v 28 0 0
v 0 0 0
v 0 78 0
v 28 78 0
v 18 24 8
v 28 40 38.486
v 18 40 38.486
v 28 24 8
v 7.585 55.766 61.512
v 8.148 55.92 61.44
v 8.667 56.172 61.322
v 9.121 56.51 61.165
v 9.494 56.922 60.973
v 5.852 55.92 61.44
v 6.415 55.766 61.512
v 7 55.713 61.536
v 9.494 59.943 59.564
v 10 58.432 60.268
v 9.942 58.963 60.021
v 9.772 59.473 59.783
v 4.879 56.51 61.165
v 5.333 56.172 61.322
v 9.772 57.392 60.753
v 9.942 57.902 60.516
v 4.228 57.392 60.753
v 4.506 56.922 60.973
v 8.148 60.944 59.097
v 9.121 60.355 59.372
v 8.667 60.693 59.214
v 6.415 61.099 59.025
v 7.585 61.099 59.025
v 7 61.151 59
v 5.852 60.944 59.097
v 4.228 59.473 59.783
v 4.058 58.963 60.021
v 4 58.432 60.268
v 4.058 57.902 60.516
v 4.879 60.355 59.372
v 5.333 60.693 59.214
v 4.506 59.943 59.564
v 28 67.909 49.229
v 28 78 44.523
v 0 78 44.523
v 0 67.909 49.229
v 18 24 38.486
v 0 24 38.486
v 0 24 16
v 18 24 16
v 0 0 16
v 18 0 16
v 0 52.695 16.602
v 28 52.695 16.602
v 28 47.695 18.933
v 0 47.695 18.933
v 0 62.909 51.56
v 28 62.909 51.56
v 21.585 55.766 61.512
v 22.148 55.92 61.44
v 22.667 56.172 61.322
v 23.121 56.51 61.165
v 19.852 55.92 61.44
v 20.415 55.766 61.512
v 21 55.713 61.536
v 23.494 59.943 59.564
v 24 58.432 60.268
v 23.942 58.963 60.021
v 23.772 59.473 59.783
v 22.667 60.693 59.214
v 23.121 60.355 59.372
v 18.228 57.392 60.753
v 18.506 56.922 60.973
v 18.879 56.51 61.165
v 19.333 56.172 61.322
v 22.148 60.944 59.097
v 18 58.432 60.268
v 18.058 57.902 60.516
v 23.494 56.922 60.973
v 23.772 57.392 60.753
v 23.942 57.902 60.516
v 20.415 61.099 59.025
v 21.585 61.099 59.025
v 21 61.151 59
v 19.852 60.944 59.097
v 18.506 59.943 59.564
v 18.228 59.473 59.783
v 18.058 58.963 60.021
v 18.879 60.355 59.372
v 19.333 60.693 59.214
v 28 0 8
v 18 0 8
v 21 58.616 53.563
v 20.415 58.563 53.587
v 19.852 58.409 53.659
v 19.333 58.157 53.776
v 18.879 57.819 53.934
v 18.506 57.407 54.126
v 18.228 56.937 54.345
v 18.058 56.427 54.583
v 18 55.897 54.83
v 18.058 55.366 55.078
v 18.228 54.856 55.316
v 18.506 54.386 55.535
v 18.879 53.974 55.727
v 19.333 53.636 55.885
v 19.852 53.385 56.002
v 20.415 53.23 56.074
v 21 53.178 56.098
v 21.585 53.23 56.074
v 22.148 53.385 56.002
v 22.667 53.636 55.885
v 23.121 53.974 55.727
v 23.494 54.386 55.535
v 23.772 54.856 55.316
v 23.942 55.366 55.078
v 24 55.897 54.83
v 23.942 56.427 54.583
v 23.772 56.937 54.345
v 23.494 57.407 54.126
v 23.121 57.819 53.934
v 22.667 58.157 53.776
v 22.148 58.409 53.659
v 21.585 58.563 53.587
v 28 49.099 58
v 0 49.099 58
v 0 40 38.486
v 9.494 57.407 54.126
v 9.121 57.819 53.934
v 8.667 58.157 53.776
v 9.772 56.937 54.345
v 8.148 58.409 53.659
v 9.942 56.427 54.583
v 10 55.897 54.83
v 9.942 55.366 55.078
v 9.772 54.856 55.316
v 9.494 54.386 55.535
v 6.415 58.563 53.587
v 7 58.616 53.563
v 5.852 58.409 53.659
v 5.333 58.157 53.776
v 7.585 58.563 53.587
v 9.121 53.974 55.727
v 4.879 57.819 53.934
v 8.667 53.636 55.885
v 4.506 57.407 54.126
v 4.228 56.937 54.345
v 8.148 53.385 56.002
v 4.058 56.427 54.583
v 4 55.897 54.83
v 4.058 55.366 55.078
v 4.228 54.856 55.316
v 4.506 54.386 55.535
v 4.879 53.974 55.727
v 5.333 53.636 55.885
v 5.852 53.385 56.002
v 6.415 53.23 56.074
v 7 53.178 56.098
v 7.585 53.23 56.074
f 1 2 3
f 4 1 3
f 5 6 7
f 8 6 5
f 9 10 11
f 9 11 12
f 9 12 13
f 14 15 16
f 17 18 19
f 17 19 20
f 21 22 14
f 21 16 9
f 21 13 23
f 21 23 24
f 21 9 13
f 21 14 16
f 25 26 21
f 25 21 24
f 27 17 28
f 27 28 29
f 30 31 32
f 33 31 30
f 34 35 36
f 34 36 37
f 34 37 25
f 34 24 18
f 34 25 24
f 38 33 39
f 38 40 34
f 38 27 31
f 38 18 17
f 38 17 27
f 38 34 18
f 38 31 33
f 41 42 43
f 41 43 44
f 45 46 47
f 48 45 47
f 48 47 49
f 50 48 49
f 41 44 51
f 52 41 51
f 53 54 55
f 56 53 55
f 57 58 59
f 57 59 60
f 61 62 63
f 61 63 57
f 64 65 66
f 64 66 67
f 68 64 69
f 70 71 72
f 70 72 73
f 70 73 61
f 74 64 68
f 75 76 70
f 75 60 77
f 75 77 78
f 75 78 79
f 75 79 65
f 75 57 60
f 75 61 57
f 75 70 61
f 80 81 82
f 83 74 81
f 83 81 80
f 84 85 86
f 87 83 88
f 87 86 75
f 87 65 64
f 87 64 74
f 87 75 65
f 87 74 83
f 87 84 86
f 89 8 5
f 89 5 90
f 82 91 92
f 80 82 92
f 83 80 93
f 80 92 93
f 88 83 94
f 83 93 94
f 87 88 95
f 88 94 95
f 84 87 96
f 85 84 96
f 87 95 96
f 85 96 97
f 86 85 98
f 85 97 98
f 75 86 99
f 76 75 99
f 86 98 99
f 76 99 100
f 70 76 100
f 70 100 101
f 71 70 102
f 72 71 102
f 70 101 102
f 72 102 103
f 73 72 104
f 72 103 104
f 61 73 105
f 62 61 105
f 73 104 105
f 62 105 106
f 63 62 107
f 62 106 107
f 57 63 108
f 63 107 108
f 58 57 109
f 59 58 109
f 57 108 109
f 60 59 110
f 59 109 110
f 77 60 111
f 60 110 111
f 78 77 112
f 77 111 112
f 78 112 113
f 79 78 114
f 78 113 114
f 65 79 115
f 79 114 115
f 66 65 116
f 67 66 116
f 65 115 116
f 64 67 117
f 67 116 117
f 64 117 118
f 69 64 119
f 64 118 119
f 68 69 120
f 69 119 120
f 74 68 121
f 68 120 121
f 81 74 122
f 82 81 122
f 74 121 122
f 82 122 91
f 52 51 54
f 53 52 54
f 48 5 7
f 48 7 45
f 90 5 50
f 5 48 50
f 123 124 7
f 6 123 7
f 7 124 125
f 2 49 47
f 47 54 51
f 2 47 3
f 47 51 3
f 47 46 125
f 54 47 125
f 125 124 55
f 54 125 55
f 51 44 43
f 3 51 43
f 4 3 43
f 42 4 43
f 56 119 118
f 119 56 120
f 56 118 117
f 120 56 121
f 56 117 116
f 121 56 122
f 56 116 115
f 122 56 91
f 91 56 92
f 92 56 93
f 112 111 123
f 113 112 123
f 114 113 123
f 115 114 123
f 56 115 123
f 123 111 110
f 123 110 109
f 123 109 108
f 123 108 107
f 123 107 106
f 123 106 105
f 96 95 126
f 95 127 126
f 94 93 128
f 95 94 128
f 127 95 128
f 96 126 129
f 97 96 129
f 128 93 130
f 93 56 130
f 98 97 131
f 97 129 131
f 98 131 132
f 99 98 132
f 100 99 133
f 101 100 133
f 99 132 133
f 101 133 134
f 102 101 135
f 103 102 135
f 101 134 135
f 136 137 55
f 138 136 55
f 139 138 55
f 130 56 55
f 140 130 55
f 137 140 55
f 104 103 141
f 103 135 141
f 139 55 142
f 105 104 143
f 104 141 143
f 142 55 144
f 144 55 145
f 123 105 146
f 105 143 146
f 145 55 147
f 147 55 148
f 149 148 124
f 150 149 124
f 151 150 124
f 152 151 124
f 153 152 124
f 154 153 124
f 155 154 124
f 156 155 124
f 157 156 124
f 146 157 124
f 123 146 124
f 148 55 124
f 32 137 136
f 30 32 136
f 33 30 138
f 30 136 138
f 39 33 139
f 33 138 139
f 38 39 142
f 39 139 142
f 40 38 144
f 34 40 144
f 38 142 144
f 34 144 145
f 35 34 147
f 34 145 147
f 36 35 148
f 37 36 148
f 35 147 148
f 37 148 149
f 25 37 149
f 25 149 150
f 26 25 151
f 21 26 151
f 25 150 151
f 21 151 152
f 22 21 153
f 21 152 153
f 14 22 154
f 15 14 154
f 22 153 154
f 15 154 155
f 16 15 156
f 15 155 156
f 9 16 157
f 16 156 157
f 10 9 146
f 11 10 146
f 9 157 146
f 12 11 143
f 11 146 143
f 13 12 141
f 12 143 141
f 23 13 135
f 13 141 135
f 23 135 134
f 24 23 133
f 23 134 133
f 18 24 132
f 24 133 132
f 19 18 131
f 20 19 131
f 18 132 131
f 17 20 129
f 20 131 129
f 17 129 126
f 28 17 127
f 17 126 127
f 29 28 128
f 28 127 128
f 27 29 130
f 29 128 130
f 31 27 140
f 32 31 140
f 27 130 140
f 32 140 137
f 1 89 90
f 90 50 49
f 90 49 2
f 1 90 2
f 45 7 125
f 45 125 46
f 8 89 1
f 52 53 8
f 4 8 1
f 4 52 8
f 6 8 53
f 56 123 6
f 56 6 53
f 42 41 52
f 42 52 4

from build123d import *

# Parameters (mm, degrees)
BOSS_EXTRUDE1_DEPTH = 28
CUT_EXTRUDE1_START  = 28
CUT_EXTRUDE1_DEPTH  = 10
BOSS_EXTRUDE2_START = -10
SKETCH5_R           = 3
BOSS_EXTRUDE2_DEPTH = 6


with BuildPart() as part:
    # Sketch2 → Boss-Extrude1 (new body)
    with BuildSketch(Plane.YZ):
        Polygon((0, 0), (78, 0), (78, 44.523418625), (67.909286037, 49.228795822), (52.695028614, 16.601715489), (47.695028614, 18.933253779), (62.909286037, 51.560334113), (49.099377976, 58), (40, 38.486320959), (24, 38.486320959), (24, 16), (0, 16), (0, 8), align=None)
    extrude(amount=BOSS_EXTRUDE1_DEPTH)

    # Sketch3 → Cut-Extrude1 (cut)
    with BuildSketch(Plane.YZ.offset(CUT_EXTRUDE1_START)):
        Polygon((0, 8), (0, 16), (24, 16), (24, 38.486320959), (40, 38.486320959), (24, 8), align=None)
    extrude(amount=-CUT_EXTRUDE1_DEPTH, mode=Mode.SUBTRACT)

    # Sketch5 → Boss-Extrude2 (add)
    with BuildSketch(Plane(origin=(0, 35.210924553, 75.510071381), x_dir=(1, 0, 0), z_dir=(0, 0.42261826174070044, 0.9063077870366496)).offset(BOSS_EXTRUDE2_START)):
        with Locations(Location((7, 27.487289417, 0), (0, 0, 90))):
            Circle(SKETCH5_R)
        with Locations(Location((21, 27.487289417, 0), (0, 0, 90))):
            Circle(SKETCH5_R)
    extrude(amount=BOSS_EXTRUDE2_DEPTH)


solid = part.part
